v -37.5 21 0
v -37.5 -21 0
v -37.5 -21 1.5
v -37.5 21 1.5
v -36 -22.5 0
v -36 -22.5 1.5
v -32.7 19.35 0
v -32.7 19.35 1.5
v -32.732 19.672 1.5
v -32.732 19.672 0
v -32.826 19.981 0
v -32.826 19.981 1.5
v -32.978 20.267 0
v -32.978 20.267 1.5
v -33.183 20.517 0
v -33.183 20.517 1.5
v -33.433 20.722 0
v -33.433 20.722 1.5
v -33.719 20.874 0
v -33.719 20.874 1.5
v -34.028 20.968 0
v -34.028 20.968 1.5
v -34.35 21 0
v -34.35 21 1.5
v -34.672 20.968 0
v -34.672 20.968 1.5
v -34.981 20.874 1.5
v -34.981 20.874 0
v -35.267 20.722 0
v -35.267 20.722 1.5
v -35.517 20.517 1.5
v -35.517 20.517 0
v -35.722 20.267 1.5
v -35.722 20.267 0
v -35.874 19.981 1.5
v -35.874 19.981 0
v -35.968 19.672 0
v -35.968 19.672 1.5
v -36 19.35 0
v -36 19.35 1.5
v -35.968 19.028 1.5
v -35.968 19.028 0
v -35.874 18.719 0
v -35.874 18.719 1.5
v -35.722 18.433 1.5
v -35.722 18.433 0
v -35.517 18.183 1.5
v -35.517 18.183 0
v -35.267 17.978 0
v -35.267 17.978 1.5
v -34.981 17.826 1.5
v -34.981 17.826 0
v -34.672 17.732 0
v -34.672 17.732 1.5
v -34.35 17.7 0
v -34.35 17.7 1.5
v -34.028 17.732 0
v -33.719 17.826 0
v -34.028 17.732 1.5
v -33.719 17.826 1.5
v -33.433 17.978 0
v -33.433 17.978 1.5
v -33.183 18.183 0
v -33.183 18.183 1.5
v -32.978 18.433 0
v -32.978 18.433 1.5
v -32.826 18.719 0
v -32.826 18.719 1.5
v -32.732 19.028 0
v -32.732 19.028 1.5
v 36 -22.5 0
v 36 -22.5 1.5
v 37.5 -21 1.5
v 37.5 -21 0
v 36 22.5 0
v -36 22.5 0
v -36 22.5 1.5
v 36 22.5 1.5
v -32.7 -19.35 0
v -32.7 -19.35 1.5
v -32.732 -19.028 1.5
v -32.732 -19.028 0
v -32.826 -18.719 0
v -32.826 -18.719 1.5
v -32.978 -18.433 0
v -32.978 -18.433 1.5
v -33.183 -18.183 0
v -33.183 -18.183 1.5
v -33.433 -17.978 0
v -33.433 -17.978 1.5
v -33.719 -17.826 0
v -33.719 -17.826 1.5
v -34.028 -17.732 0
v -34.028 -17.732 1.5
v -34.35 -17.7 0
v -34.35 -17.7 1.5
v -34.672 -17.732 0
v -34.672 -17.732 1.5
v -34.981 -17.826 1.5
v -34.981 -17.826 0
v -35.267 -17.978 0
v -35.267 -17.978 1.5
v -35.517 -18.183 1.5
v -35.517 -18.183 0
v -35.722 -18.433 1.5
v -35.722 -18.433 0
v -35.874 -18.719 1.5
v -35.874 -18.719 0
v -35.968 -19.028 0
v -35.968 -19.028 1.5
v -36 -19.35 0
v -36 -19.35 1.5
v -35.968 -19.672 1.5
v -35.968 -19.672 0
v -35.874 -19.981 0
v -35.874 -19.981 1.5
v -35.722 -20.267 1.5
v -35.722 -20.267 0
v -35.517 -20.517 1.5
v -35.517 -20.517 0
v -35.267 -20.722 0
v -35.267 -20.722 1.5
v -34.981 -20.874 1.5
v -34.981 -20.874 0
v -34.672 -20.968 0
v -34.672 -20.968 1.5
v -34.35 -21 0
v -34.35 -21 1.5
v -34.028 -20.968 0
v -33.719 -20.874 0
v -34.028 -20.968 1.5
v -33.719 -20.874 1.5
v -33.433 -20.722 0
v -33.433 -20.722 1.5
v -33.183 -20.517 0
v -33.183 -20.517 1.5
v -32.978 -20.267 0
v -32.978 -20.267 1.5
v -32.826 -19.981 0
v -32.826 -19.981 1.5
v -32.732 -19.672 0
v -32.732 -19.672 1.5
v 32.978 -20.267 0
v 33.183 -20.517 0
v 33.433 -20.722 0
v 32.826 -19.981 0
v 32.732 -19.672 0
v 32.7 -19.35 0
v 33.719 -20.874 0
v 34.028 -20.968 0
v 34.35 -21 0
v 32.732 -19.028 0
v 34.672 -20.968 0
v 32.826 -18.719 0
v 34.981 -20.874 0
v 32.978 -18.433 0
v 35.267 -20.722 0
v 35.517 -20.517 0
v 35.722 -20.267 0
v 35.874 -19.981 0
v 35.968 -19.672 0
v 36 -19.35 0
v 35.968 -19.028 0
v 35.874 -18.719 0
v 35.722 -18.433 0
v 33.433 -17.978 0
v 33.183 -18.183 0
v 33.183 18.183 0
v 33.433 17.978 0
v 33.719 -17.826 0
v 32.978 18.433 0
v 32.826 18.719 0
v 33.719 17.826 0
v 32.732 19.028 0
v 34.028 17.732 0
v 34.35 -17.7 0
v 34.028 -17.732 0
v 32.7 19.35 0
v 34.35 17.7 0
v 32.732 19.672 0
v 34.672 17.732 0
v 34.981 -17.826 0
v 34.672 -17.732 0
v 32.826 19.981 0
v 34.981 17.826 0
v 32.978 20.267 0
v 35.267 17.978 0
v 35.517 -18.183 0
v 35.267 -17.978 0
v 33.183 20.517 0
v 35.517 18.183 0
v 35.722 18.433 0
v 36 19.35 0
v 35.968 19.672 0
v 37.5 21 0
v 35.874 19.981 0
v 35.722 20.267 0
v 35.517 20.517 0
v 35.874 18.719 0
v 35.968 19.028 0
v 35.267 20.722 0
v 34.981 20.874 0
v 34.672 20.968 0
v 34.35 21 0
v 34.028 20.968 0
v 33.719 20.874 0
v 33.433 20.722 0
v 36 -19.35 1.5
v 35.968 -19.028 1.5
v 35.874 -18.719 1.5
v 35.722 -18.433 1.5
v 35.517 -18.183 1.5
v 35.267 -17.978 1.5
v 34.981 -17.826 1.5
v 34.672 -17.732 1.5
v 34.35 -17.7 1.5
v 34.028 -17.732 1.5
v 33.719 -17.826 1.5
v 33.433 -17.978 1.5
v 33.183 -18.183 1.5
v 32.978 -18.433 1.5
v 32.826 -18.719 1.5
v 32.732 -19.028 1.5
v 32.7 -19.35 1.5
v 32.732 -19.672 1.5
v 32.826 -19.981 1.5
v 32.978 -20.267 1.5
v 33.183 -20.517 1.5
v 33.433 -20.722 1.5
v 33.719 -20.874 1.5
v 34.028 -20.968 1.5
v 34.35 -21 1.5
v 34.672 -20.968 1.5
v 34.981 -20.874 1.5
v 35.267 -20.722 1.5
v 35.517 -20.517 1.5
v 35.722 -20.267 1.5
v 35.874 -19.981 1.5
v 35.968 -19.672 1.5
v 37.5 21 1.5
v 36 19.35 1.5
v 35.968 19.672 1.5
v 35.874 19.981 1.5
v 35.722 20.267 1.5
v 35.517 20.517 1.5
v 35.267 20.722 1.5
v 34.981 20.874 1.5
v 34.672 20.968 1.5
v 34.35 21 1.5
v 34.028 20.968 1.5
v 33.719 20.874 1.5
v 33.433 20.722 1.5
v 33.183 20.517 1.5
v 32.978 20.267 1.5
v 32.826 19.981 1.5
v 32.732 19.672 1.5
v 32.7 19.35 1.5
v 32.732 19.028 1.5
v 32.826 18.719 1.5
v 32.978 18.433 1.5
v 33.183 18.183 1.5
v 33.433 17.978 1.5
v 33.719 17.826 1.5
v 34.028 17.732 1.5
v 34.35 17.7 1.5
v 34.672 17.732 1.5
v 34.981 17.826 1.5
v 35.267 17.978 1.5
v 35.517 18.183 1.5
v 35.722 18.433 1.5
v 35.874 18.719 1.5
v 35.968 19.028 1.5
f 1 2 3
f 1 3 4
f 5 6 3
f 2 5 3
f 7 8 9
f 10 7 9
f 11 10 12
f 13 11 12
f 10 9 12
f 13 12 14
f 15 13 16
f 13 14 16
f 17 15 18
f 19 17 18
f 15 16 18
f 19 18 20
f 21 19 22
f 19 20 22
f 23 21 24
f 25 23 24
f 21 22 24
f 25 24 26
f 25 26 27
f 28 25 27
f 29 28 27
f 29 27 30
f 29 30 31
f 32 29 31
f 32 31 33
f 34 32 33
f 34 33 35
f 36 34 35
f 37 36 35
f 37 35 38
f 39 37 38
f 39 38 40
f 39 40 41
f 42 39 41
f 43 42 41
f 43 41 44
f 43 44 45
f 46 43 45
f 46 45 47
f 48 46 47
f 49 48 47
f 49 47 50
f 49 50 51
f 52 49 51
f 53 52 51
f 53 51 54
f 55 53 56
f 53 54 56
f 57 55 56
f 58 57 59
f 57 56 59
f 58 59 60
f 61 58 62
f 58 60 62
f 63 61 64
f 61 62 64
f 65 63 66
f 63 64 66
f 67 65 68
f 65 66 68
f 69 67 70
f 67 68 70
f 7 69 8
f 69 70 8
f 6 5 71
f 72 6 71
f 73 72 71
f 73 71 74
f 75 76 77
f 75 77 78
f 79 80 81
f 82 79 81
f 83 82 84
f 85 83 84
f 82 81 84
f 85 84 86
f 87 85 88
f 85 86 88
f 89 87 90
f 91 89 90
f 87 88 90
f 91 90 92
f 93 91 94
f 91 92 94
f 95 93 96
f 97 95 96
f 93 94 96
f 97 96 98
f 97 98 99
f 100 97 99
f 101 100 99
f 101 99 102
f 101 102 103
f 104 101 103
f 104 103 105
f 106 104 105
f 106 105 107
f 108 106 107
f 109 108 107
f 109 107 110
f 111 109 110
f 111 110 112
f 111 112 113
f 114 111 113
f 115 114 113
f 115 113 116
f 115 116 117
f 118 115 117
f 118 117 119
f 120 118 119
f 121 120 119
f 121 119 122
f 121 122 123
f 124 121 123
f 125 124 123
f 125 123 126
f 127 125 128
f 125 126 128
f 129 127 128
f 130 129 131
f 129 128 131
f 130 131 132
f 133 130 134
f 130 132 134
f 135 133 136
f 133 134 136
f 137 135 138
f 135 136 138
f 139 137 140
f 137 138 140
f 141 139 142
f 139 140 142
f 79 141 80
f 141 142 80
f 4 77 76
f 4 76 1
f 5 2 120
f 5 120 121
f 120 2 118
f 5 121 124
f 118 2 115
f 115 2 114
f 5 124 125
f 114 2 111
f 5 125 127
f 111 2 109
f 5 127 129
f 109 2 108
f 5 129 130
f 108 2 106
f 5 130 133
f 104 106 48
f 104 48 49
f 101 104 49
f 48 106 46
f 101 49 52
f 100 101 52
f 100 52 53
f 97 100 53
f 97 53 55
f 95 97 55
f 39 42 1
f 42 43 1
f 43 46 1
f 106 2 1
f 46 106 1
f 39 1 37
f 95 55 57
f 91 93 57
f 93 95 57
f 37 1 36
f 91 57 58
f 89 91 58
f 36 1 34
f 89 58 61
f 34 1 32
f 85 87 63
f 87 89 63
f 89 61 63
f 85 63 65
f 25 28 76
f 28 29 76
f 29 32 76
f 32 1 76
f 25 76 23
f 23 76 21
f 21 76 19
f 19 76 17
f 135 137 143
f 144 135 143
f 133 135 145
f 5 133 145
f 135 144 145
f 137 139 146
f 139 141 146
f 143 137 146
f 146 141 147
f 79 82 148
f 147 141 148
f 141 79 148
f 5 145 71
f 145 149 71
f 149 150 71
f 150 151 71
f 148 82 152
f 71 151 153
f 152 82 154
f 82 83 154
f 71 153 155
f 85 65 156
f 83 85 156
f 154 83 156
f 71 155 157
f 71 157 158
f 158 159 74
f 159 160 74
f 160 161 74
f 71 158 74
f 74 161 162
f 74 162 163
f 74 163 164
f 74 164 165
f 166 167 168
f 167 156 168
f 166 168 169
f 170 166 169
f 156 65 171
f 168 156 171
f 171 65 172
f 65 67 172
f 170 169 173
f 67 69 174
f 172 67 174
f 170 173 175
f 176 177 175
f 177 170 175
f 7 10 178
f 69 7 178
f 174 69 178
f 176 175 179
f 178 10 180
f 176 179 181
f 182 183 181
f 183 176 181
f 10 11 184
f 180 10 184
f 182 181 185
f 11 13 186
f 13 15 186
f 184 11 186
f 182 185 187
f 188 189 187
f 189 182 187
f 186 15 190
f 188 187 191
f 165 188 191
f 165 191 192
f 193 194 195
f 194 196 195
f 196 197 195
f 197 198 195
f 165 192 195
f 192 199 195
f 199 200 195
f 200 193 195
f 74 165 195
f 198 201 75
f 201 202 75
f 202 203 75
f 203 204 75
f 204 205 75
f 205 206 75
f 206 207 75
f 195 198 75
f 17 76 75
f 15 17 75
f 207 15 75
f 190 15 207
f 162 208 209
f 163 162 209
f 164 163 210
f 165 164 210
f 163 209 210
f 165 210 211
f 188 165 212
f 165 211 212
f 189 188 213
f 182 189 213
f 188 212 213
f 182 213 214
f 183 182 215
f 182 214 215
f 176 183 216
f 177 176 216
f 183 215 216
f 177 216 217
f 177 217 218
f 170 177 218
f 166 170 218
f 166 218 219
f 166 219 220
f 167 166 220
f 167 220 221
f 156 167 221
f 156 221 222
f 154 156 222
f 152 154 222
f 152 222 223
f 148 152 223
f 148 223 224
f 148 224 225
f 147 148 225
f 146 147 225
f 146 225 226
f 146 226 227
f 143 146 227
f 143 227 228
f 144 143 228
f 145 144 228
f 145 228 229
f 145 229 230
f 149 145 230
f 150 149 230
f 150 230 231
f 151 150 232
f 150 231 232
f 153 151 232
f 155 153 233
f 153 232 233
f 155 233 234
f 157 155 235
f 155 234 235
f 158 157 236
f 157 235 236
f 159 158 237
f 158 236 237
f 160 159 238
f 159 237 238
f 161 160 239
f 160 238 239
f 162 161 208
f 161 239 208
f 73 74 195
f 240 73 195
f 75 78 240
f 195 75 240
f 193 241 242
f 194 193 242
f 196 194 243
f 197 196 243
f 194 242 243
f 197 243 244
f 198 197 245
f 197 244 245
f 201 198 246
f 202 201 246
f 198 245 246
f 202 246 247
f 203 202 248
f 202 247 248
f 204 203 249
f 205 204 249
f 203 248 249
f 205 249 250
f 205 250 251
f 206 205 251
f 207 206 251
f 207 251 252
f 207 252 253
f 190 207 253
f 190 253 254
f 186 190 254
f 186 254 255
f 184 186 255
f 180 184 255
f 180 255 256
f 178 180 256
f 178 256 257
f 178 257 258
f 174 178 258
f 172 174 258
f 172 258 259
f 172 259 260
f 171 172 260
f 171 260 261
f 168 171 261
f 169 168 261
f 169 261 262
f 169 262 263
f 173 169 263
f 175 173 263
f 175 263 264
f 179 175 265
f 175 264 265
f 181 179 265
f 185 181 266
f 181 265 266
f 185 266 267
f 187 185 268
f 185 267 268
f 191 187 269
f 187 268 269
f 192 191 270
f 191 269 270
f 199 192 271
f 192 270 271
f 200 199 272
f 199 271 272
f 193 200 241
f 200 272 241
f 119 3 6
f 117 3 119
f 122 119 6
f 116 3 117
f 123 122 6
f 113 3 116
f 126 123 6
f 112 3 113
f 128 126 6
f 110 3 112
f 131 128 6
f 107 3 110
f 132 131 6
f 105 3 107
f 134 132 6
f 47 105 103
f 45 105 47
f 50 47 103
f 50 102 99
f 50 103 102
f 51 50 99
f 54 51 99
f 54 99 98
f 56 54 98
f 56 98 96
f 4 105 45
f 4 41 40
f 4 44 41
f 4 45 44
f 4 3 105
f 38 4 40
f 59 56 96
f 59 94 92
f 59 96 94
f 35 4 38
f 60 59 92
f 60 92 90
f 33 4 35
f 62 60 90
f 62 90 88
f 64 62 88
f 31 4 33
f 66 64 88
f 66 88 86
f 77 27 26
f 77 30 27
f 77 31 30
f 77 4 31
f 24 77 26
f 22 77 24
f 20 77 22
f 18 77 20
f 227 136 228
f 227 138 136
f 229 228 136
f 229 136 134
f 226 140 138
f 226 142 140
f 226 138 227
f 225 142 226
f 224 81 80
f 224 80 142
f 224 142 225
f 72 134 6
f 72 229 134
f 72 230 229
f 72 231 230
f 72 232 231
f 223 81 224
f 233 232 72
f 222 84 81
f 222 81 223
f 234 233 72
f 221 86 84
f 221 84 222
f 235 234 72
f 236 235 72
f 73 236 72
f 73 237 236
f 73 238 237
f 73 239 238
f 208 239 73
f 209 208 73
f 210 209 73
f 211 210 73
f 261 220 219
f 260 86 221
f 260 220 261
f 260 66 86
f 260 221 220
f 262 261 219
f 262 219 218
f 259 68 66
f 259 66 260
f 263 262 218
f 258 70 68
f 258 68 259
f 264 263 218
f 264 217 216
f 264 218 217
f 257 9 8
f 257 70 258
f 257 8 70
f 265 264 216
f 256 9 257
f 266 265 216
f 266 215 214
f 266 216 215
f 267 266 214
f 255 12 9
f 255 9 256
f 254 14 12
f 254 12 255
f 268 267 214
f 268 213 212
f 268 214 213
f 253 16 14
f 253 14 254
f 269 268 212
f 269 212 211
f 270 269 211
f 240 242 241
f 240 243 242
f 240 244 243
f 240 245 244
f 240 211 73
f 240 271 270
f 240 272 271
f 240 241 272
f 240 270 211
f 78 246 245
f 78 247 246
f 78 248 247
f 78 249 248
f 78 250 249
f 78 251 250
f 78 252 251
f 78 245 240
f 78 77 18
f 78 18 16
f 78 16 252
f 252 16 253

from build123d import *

# Parameters (mm, degrees)
SKETCH1_W           = 75
SKETCH1_H           = 45
BOSS_EXTRUDE1_DEPTH = 1.5
SKETCH2_R           = 1.65
CUT_EXTRUDE1_DEPTH  = 2.5


with BuildPart() as part:
    # Sketch1 → Boss-Extrude1 (new body)
    with BuildSketch(Plane.XY):
        Rectangle(SKETCH1_W, SKETCH1_H)
    extrude(amount=BOSS_EXTRUDE1_DEPTH)

    # Sketch2 → Cut-Extrude1 (cut, through all)
    with BuildSketch(Plane.XY.offset(1.5)):
        with Locations((-34.35, 19.35)):
            Circle(SKETCH2_R)
        with Locations((34.35, 19.35)):
            Circle(SKETCH2_R)
        with Locations((34.35, -19.35)):
            Circle(SKETCH2_R)
        with Locations((-34.35, -19.35)):
            Circle(SKETCH2_R)
        Polygon((-37.5, 22.5), (-36, 22.5), (-37.5, 21), align=None)
        Polygon((37.5, 22.5), (36, 22.5), (37.5, 21), align=None)
        Polygon((37.5, -21), (37.5, -22.5), (36, -22.5), align=None)
        Polygon((-37.5, -22.5), (-36, -22.5), (-37.5, -21), align=None)
    extrude(amount=-CUT_EXTRUDE1_DEPTH, mode=Mode.SUBTRACT)


solid = part.part
